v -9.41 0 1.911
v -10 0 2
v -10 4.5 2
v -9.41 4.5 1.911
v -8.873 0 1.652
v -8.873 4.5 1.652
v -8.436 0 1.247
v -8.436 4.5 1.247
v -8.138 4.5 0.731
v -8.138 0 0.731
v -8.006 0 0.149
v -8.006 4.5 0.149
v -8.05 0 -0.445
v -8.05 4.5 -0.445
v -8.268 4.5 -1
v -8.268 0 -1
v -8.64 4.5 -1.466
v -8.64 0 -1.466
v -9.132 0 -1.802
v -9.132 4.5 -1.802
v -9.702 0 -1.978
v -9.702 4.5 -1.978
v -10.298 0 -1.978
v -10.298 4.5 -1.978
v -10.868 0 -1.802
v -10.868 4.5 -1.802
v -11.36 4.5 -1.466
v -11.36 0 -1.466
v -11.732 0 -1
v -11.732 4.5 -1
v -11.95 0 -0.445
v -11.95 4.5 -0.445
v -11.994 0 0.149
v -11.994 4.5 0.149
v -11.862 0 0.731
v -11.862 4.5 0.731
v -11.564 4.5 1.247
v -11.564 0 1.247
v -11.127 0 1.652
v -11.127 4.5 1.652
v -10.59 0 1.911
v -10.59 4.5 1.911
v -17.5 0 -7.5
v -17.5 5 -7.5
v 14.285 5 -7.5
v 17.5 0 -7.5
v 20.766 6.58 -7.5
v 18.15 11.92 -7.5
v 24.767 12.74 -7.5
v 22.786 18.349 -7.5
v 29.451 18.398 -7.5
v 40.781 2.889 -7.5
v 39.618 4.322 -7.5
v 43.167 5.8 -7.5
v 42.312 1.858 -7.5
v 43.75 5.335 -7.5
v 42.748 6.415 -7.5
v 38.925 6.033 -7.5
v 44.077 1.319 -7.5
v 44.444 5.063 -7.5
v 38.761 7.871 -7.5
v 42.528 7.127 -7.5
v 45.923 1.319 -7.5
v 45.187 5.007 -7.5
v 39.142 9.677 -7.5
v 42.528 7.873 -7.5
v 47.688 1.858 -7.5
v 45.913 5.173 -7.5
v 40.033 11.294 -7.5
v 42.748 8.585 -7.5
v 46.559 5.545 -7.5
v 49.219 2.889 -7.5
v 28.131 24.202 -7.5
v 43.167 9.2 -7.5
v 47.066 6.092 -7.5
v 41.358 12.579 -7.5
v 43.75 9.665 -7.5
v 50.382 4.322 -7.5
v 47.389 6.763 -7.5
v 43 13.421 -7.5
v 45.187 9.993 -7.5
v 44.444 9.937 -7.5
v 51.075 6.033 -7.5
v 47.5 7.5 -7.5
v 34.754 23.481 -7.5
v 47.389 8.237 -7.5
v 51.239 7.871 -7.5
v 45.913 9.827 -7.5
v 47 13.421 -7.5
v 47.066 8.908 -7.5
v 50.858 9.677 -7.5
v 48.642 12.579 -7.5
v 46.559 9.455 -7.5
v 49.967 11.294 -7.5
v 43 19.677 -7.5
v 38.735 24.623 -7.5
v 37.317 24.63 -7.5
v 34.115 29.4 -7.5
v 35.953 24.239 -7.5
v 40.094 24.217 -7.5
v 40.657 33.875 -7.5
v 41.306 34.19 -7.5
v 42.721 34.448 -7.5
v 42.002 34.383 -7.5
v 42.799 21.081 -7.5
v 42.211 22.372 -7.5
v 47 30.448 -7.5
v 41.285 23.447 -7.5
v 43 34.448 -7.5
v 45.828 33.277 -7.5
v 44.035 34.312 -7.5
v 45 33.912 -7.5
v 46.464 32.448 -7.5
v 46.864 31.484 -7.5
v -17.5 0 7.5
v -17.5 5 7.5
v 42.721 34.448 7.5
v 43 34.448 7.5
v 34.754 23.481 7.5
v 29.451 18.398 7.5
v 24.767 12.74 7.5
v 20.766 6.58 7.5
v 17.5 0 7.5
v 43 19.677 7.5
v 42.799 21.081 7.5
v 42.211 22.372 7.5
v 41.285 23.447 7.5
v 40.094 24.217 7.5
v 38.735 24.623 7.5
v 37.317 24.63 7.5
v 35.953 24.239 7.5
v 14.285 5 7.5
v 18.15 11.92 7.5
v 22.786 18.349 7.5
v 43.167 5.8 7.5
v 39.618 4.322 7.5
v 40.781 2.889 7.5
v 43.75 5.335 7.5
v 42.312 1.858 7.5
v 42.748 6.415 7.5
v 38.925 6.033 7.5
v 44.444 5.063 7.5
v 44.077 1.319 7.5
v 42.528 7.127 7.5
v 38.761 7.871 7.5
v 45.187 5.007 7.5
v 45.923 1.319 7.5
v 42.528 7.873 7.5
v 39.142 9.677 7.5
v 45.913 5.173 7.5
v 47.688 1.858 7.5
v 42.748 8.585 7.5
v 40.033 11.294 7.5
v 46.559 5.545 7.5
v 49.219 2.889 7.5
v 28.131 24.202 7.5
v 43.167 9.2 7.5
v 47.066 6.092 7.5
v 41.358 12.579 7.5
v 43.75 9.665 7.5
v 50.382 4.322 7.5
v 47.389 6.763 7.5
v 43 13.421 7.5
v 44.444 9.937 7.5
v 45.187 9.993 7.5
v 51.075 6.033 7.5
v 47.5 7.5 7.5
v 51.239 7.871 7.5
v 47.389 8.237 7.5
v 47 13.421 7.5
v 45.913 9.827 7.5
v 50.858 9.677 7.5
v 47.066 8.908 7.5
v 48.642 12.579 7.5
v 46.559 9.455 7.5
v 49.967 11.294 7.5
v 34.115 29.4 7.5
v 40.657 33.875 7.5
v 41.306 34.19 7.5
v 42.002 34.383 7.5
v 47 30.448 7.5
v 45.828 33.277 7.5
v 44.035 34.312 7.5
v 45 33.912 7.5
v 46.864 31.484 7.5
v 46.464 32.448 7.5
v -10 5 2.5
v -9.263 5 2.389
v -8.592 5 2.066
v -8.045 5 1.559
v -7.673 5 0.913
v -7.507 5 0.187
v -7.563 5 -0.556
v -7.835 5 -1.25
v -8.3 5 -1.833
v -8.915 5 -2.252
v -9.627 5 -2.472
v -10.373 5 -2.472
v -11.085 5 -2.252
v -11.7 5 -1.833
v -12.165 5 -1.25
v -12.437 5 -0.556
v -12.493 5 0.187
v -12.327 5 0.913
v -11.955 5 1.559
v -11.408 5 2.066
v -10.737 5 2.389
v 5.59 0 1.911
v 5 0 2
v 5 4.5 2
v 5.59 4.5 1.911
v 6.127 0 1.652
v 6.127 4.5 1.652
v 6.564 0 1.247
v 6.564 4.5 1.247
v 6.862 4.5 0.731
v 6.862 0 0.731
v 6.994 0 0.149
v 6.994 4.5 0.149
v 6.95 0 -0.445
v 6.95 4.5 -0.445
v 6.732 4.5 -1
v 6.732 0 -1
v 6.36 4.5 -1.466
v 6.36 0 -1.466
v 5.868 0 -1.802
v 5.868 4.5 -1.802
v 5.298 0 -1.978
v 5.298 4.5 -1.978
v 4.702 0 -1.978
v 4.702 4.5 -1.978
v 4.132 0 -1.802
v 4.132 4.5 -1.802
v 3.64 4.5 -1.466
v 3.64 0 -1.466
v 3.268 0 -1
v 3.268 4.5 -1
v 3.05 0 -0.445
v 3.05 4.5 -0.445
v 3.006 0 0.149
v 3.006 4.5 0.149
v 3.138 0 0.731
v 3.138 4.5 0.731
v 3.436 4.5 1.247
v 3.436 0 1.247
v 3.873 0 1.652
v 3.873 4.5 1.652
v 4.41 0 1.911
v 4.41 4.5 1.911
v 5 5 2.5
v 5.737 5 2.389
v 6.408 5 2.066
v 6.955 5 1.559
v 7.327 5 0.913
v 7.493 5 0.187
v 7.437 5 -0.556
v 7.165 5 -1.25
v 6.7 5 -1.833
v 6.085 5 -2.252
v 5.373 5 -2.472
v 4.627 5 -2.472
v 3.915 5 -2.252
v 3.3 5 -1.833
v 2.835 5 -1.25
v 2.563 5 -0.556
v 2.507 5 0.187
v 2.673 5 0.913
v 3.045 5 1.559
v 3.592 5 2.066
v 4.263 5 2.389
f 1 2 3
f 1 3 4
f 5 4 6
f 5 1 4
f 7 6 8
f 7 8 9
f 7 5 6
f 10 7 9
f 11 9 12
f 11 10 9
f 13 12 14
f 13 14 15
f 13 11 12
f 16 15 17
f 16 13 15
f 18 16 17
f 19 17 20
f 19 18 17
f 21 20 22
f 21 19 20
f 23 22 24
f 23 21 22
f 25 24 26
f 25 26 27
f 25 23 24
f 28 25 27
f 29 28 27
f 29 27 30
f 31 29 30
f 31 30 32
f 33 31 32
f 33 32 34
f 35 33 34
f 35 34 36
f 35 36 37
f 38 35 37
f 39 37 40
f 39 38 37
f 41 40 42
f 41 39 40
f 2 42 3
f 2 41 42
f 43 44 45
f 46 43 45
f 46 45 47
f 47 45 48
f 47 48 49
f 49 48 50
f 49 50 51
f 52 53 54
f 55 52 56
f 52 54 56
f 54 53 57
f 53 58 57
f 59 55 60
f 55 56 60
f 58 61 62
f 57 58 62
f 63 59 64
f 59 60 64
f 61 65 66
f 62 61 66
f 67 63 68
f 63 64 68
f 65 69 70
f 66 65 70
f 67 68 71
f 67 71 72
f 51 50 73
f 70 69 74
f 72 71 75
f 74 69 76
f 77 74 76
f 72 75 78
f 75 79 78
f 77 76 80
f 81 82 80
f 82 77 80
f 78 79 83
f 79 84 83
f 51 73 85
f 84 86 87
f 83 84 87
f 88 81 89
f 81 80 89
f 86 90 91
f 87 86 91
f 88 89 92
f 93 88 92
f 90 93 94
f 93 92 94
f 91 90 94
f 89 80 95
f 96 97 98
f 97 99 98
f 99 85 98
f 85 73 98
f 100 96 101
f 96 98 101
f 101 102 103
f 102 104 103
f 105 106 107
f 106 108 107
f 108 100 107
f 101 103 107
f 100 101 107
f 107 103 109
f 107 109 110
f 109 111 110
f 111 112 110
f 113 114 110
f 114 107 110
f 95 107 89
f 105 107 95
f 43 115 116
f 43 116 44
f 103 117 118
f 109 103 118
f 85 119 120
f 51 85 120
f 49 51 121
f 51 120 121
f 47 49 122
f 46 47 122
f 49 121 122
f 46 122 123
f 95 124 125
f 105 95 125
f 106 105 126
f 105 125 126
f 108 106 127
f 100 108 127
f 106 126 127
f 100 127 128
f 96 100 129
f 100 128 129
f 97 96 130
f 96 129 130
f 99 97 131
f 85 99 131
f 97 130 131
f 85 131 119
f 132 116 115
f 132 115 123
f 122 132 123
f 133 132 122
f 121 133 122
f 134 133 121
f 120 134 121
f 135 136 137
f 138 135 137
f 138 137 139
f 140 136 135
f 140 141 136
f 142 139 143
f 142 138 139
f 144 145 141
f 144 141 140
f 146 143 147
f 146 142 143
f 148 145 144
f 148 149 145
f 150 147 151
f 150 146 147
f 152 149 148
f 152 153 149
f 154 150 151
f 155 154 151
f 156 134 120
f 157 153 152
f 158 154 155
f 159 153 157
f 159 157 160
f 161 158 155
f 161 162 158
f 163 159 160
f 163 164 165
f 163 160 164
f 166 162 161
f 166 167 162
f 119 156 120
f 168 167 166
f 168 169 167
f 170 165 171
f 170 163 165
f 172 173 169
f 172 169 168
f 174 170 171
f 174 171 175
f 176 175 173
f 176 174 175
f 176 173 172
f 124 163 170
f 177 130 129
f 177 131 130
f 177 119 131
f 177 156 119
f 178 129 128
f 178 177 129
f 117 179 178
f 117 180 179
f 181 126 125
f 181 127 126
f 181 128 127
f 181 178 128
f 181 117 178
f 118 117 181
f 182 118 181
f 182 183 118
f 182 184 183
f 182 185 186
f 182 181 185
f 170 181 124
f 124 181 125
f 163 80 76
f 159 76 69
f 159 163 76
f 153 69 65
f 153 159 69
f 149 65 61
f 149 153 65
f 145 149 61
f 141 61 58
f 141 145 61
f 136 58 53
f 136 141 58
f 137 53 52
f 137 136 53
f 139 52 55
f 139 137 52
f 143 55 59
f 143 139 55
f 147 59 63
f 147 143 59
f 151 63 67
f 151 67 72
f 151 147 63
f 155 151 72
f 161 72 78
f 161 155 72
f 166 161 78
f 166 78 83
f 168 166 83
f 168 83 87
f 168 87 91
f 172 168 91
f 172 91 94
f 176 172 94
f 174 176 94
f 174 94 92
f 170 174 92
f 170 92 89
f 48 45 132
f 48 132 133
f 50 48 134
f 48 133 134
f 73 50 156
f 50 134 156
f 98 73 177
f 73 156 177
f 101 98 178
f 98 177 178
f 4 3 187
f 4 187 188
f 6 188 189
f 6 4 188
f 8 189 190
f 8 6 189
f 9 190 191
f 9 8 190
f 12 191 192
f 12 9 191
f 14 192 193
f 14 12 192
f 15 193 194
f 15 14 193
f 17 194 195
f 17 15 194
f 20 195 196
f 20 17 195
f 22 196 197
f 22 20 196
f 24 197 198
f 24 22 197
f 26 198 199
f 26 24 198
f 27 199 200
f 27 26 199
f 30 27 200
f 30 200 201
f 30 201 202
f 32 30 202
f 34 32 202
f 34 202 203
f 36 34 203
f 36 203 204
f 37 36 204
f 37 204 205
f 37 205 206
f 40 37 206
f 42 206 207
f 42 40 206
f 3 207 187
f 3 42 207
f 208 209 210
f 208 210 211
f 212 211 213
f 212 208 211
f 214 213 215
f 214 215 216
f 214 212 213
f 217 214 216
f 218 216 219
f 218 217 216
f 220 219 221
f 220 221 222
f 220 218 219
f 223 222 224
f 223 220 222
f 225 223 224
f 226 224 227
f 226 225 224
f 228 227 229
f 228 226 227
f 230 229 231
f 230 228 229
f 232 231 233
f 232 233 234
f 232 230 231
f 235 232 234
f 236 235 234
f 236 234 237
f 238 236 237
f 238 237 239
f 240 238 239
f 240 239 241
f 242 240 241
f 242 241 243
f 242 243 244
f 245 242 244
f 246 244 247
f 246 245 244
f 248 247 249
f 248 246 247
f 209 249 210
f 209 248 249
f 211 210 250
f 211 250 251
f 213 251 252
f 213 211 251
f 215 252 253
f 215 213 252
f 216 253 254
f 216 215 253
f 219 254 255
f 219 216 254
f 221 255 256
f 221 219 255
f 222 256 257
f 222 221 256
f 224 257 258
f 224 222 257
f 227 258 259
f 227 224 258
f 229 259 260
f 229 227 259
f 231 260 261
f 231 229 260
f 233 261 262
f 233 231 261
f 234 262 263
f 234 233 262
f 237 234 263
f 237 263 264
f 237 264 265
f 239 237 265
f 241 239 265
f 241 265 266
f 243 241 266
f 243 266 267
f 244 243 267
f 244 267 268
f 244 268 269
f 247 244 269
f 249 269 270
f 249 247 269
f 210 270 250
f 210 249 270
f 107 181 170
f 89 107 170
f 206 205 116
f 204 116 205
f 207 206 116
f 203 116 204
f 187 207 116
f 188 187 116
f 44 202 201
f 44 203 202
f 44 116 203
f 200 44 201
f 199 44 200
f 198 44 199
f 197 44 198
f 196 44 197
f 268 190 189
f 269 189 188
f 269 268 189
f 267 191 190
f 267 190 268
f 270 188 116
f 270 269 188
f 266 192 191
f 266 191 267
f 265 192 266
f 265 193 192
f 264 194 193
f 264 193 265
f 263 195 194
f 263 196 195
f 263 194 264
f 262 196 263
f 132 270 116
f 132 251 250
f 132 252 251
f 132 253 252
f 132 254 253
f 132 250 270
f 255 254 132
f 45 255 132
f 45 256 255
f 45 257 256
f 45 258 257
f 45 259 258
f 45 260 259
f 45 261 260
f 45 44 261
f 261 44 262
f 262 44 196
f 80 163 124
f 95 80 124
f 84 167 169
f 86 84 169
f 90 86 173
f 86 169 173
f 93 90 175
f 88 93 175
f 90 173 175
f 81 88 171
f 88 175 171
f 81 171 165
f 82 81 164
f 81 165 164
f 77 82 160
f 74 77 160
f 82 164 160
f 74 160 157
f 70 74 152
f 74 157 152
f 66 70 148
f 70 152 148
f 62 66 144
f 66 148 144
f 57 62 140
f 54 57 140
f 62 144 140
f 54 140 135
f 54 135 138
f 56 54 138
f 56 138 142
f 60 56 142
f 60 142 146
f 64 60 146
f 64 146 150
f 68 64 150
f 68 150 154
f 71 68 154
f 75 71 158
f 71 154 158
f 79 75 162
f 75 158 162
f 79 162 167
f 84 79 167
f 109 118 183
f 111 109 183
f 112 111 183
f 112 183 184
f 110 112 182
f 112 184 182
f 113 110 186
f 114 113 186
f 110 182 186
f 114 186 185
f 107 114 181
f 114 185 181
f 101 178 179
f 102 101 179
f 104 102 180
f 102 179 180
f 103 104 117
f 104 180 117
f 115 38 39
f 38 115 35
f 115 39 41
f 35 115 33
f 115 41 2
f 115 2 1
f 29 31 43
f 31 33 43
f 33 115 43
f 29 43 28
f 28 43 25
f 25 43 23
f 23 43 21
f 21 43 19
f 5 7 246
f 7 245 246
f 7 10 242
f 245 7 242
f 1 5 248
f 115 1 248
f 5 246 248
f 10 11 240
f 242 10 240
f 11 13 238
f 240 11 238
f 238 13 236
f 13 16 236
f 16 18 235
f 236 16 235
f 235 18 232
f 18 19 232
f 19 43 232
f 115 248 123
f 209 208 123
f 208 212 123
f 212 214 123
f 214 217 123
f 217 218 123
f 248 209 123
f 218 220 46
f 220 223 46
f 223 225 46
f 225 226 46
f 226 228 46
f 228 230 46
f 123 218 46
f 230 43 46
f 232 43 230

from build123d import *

# Parameters (mm, degrees)
SKETCH2_W           = 35
SKETCH2_H           = 15
SKETCH2_R           = 2
BOSS_EXTRUDE1_DEPTH = 5
BOSS_EXTRUDE6_DEPTH = 15
SKETCH8_R           = 6.25
BOSS_EXTRUDE7_DEPTH = 15
SKETCH10_R          = 2.5
CUT_EXTRUDE1_DEPTH  = 15
CHAMFER1_SIZE       = 0.5


with BuildPart() as part:
    # Sketch2 → Boss-Extrude1 (new body)
    with BuildSketch(Plane(origin=(0, 0, 0), x_dir=(1, 0, 0), z_dir=(0, 1, 0))):
        Rectangle(SKETCH2_W, SKETCH2_H)
        with Locations(Location((-10, 0, 0), (0, 0, 270))):
            Circle(SKETCH2_R, mode=Mode.SUBTRACT)
        with Locations(Location((5, 0, 0), (0, 0, 270))):
            Circle(SKETCH2_R, mode=Mode.SUBTRACT)
    extrude(amount=BOSS_EXTRUDE1_DEPTH)

    # Sketch6 → Boss-Extrude6 (add)
    with BuildSketch(Plane.XY.offset(7.5)):
        with BuildLine():
            Line((17.5, 0), (12.099846669, 0))
            ThreePointArc((12.099846669, 0), (23.57401107, 19.301397513), (40.656768617, 33.874653474))
            ThreePointArc((40.656768617, 33.874653474), (41.649703253, 34.30227285), (42.720886305, 34.44837004))
            Line((42.720886305, 34.44837004), (43, 34.44837004))
            ThreePointArc((43, 34.44837004), (45.828427125, 33.276797165), (47, 30.44837004))
            Line((47, 30.44837004), (47, 7.5))
            Line((47, 7.5), (43, 7.5))
            Line((43, 7.5), (43, 19.677123519))
            ThreePointArc((43, 19.677123519), (40.094264769, 24.217393894), (34.754377969, 23.480534834))
            ThreePointArc((34.754377969, 23.480534834), (24.767284072, 12.739576569), (17.5, 0))
        make_face()
    extrude(amount=-BOSS_EXTRUDE6_DEPTH)

    # Sketch8 → Boss-Extrude7 (add)
    with BuildSketch(Plane.XY.offset(7.5)):
        with Locations((45, 7.5)):
            Circle(SKETCH8_R)
    extrude(amount=-BOSS_EXTRUDE7_DEPTH)

    # Sketch10 → Cut-Extrude1 (cut)
    with BuildSketch(Plane.XY.offset(7.5)):
        with Locations((45, 7.5)):
            Circle(SKETCH10_R)
    extrude(amount=-CUT_EXTRUDE1_DEPTH, mode=Mode.SUBTRACT)

    # Chamfer1
    chamfer1_edges = [part.edges().sort_by_distance(p)[0] for p in [
        (-10, 5, -2),
        (5, 5, -2),
    ]]
    chamfer(chamfer1_edges, length=CHAMFER1_SIZE)


solid = part.part
